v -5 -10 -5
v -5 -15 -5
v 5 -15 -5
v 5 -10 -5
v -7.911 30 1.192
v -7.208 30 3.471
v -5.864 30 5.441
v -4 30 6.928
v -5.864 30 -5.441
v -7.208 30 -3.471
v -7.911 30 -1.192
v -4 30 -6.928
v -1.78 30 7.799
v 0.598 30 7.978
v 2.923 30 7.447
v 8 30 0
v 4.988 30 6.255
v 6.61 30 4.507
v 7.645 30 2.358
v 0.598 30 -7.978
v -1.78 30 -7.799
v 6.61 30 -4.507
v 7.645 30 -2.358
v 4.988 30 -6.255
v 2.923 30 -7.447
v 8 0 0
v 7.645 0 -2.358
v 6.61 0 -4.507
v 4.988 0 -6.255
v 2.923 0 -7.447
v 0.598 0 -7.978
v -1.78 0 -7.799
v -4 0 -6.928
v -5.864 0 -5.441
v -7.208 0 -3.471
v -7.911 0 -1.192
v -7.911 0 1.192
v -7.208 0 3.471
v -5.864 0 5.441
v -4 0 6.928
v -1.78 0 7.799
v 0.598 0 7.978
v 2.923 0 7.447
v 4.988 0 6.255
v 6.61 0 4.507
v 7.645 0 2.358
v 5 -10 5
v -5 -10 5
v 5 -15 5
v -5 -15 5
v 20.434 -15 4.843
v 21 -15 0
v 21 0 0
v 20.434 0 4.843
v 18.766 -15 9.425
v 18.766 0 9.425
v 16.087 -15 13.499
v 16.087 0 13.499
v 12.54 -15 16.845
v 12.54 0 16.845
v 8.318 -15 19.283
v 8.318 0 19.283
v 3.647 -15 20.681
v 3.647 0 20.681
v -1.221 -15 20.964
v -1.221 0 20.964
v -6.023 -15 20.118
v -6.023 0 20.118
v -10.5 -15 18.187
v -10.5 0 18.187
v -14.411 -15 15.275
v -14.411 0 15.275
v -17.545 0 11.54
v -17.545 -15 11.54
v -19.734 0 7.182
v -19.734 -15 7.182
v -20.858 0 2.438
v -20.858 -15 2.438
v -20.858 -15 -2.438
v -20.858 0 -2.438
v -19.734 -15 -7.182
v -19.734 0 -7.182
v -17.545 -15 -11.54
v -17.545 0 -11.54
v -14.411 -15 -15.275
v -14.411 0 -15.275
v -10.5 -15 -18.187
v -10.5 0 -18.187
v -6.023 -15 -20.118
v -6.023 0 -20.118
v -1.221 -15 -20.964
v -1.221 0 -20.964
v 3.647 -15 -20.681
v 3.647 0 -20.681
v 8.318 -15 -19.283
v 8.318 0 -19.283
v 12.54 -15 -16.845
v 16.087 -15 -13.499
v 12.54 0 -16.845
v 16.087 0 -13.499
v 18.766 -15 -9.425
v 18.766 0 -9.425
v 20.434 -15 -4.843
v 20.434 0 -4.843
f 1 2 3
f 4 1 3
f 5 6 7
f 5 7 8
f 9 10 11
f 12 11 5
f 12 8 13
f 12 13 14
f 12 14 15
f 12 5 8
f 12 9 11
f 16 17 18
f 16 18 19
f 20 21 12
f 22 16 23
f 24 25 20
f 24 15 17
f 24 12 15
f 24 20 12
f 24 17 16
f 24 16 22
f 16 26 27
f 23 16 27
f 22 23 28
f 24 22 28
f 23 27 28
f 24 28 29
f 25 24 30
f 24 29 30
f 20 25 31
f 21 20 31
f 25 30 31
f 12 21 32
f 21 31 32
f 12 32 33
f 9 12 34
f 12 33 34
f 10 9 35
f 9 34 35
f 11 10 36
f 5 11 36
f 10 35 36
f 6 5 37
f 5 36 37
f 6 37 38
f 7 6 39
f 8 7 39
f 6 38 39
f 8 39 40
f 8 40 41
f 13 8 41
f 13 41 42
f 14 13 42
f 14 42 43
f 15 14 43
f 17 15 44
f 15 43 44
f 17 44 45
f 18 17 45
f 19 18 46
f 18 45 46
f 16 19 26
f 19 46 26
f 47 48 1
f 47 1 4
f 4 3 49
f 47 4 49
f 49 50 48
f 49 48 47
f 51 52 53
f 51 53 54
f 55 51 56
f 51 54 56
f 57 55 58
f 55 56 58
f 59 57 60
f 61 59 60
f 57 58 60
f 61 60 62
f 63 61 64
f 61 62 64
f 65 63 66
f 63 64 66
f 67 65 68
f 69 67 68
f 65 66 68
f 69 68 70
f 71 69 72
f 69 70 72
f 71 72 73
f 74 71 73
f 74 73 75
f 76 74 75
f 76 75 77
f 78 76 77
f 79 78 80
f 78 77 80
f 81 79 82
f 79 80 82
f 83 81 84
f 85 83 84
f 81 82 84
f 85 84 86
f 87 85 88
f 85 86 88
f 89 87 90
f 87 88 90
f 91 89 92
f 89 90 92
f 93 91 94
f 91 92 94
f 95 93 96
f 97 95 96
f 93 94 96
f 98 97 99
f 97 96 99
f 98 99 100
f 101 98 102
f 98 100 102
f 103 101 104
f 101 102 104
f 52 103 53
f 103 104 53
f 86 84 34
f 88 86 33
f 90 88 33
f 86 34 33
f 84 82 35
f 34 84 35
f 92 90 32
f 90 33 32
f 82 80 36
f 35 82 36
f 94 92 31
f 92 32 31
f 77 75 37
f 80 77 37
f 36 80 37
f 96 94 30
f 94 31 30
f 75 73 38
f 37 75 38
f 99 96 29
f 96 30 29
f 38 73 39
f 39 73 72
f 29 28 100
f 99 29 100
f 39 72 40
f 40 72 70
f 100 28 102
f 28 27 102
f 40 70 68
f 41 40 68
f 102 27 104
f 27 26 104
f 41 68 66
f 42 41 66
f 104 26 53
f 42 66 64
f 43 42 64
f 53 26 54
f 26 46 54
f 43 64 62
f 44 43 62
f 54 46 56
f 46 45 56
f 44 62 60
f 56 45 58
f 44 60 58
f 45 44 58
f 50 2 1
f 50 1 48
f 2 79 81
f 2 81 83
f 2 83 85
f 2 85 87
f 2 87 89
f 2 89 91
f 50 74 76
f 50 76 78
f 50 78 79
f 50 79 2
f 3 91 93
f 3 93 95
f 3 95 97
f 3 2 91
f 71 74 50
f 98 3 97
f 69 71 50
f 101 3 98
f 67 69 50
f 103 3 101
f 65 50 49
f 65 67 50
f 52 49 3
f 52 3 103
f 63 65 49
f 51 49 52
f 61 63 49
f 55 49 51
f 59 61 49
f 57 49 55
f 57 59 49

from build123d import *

# Parameters (mm, degrees)
SKETCH_R     = 21
PAD_DEPTH    = 15
SKETCH001_W  = 10
SKETCH001_H  = 10
POCKET_DEPTH = 5
SKETCH002_R  = 8
PAD001_DEPTH = 30


with BuildPart() as part:
    # Sketch → Pad (new body)
    with BuildSketch(Plane.XZ):
        Circle(SKETCH_R)
    extrude(amount=PAD_DEPTH)

    # Sketch001 → Pocket (cut)
    with BuildSketch(Plane.XZ.offset(15)):
        Rectangle(SKETCH001_W, SKETCH001_H)
    extrude(amount=-POCKET_DEPTH, mode=Mode.SUBTRACT)

    # Sketch002 → Pad001 (new body)
    with BuildSketch(Plane(origin=(0, 0, 0), x_dir=(1, 0, 0), z_dir=(0, 1, 0))):
        Circle(SKETCH002_R)
    extrude(amount=PAD001_DEPTH)


solid = part.part
